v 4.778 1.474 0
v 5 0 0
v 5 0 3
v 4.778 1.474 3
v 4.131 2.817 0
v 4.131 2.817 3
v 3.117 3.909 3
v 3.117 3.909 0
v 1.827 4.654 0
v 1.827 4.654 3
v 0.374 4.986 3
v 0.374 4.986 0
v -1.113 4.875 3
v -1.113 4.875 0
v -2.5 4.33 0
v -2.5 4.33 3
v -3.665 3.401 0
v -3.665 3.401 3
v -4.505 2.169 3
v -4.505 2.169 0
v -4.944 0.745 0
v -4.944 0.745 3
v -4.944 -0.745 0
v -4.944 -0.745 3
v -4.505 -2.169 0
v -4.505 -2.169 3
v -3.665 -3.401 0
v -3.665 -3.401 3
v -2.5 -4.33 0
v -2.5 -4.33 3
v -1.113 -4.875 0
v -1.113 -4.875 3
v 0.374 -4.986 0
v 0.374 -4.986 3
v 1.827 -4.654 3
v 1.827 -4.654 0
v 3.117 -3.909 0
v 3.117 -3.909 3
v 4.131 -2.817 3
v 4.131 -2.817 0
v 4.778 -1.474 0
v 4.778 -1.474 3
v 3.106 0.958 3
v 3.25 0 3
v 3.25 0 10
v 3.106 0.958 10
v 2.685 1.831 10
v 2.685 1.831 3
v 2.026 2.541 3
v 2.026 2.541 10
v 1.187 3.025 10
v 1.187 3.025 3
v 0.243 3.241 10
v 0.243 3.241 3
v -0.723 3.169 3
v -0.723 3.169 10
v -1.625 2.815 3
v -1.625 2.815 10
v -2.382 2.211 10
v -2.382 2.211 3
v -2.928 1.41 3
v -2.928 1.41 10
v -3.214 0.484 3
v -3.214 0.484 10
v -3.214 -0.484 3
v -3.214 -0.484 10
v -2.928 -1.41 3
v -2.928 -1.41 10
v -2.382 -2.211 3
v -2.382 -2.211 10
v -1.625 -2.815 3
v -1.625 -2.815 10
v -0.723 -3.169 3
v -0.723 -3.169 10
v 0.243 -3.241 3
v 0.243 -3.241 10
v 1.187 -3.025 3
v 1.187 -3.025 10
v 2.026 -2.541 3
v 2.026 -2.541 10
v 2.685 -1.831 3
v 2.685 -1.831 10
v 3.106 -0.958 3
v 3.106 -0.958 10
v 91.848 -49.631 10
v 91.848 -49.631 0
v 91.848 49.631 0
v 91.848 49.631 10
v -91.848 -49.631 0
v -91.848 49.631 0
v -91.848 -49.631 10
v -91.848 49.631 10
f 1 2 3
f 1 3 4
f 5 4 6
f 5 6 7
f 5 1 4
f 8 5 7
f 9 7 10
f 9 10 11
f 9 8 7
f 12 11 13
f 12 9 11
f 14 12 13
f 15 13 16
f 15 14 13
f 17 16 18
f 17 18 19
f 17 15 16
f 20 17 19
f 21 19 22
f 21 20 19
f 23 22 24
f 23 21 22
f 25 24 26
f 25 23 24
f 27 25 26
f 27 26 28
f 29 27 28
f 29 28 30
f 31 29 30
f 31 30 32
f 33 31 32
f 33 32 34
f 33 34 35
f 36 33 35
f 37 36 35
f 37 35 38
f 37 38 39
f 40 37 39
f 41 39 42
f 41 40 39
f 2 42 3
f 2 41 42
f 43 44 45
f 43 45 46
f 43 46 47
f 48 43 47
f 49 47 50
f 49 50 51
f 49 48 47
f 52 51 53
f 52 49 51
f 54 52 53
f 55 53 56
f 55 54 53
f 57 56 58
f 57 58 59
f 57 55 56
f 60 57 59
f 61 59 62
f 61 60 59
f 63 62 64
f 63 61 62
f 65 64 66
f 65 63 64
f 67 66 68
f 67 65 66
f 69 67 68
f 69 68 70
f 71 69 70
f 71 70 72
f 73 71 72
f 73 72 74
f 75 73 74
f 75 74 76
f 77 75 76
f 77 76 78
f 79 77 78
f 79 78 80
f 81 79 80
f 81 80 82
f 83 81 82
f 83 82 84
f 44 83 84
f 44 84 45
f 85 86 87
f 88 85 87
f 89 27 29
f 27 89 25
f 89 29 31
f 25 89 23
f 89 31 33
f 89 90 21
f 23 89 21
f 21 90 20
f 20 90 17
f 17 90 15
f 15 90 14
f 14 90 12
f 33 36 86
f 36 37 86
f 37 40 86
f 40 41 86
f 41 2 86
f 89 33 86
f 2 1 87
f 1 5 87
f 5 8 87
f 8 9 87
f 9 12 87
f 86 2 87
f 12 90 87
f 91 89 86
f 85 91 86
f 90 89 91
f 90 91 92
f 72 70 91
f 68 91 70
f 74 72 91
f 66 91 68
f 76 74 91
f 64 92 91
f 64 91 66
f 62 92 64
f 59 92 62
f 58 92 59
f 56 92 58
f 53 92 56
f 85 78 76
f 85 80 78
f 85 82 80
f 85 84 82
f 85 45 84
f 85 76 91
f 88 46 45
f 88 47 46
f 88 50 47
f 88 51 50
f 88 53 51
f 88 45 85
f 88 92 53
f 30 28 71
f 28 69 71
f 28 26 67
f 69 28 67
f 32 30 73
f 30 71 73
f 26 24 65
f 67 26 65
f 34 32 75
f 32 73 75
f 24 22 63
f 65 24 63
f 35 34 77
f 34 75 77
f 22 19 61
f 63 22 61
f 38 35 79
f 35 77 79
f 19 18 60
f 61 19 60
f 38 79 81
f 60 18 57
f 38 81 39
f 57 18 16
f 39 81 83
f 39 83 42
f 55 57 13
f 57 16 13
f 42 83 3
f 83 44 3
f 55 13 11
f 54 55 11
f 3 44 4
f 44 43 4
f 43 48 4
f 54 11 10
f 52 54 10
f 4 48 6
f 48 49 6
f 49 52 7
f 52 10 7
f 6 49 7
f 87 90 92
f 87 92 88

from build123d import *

# Parameters (mm, degrees)
F0_W     = 183.6964
F0_H     = 99.261144
F0_R     = 3.25
F1_DEPTH = 10
F2_R     = 3.25
F3_DEPTH = 3


with BuildPart() as f1:
    # F0 (on Top) → F1 (new body)
    with BuildSketch(Plane.XY):
        Rectangle(F0_W, F0_H)
        Circle(F0_R, mode=Mode.SUBTRACT)
    extrude(amount=F1_DEPTH)

    # F2 (on face) → F3 (cut)
    with BuildSketch(Plane.XY):
        with BuildLine():
            ThreePointArc((-5, 0), (0, -5), (5, 0))
            ThreePointArc((5, 0), (0, 5), (-5, 0))
        make_face()
        Circle(F2_R, mode=Mode.SUBTRACT)
    extrude(amount=F3_DEPTH, mode=Mode.SUBTRACT)


solid = f1.part
